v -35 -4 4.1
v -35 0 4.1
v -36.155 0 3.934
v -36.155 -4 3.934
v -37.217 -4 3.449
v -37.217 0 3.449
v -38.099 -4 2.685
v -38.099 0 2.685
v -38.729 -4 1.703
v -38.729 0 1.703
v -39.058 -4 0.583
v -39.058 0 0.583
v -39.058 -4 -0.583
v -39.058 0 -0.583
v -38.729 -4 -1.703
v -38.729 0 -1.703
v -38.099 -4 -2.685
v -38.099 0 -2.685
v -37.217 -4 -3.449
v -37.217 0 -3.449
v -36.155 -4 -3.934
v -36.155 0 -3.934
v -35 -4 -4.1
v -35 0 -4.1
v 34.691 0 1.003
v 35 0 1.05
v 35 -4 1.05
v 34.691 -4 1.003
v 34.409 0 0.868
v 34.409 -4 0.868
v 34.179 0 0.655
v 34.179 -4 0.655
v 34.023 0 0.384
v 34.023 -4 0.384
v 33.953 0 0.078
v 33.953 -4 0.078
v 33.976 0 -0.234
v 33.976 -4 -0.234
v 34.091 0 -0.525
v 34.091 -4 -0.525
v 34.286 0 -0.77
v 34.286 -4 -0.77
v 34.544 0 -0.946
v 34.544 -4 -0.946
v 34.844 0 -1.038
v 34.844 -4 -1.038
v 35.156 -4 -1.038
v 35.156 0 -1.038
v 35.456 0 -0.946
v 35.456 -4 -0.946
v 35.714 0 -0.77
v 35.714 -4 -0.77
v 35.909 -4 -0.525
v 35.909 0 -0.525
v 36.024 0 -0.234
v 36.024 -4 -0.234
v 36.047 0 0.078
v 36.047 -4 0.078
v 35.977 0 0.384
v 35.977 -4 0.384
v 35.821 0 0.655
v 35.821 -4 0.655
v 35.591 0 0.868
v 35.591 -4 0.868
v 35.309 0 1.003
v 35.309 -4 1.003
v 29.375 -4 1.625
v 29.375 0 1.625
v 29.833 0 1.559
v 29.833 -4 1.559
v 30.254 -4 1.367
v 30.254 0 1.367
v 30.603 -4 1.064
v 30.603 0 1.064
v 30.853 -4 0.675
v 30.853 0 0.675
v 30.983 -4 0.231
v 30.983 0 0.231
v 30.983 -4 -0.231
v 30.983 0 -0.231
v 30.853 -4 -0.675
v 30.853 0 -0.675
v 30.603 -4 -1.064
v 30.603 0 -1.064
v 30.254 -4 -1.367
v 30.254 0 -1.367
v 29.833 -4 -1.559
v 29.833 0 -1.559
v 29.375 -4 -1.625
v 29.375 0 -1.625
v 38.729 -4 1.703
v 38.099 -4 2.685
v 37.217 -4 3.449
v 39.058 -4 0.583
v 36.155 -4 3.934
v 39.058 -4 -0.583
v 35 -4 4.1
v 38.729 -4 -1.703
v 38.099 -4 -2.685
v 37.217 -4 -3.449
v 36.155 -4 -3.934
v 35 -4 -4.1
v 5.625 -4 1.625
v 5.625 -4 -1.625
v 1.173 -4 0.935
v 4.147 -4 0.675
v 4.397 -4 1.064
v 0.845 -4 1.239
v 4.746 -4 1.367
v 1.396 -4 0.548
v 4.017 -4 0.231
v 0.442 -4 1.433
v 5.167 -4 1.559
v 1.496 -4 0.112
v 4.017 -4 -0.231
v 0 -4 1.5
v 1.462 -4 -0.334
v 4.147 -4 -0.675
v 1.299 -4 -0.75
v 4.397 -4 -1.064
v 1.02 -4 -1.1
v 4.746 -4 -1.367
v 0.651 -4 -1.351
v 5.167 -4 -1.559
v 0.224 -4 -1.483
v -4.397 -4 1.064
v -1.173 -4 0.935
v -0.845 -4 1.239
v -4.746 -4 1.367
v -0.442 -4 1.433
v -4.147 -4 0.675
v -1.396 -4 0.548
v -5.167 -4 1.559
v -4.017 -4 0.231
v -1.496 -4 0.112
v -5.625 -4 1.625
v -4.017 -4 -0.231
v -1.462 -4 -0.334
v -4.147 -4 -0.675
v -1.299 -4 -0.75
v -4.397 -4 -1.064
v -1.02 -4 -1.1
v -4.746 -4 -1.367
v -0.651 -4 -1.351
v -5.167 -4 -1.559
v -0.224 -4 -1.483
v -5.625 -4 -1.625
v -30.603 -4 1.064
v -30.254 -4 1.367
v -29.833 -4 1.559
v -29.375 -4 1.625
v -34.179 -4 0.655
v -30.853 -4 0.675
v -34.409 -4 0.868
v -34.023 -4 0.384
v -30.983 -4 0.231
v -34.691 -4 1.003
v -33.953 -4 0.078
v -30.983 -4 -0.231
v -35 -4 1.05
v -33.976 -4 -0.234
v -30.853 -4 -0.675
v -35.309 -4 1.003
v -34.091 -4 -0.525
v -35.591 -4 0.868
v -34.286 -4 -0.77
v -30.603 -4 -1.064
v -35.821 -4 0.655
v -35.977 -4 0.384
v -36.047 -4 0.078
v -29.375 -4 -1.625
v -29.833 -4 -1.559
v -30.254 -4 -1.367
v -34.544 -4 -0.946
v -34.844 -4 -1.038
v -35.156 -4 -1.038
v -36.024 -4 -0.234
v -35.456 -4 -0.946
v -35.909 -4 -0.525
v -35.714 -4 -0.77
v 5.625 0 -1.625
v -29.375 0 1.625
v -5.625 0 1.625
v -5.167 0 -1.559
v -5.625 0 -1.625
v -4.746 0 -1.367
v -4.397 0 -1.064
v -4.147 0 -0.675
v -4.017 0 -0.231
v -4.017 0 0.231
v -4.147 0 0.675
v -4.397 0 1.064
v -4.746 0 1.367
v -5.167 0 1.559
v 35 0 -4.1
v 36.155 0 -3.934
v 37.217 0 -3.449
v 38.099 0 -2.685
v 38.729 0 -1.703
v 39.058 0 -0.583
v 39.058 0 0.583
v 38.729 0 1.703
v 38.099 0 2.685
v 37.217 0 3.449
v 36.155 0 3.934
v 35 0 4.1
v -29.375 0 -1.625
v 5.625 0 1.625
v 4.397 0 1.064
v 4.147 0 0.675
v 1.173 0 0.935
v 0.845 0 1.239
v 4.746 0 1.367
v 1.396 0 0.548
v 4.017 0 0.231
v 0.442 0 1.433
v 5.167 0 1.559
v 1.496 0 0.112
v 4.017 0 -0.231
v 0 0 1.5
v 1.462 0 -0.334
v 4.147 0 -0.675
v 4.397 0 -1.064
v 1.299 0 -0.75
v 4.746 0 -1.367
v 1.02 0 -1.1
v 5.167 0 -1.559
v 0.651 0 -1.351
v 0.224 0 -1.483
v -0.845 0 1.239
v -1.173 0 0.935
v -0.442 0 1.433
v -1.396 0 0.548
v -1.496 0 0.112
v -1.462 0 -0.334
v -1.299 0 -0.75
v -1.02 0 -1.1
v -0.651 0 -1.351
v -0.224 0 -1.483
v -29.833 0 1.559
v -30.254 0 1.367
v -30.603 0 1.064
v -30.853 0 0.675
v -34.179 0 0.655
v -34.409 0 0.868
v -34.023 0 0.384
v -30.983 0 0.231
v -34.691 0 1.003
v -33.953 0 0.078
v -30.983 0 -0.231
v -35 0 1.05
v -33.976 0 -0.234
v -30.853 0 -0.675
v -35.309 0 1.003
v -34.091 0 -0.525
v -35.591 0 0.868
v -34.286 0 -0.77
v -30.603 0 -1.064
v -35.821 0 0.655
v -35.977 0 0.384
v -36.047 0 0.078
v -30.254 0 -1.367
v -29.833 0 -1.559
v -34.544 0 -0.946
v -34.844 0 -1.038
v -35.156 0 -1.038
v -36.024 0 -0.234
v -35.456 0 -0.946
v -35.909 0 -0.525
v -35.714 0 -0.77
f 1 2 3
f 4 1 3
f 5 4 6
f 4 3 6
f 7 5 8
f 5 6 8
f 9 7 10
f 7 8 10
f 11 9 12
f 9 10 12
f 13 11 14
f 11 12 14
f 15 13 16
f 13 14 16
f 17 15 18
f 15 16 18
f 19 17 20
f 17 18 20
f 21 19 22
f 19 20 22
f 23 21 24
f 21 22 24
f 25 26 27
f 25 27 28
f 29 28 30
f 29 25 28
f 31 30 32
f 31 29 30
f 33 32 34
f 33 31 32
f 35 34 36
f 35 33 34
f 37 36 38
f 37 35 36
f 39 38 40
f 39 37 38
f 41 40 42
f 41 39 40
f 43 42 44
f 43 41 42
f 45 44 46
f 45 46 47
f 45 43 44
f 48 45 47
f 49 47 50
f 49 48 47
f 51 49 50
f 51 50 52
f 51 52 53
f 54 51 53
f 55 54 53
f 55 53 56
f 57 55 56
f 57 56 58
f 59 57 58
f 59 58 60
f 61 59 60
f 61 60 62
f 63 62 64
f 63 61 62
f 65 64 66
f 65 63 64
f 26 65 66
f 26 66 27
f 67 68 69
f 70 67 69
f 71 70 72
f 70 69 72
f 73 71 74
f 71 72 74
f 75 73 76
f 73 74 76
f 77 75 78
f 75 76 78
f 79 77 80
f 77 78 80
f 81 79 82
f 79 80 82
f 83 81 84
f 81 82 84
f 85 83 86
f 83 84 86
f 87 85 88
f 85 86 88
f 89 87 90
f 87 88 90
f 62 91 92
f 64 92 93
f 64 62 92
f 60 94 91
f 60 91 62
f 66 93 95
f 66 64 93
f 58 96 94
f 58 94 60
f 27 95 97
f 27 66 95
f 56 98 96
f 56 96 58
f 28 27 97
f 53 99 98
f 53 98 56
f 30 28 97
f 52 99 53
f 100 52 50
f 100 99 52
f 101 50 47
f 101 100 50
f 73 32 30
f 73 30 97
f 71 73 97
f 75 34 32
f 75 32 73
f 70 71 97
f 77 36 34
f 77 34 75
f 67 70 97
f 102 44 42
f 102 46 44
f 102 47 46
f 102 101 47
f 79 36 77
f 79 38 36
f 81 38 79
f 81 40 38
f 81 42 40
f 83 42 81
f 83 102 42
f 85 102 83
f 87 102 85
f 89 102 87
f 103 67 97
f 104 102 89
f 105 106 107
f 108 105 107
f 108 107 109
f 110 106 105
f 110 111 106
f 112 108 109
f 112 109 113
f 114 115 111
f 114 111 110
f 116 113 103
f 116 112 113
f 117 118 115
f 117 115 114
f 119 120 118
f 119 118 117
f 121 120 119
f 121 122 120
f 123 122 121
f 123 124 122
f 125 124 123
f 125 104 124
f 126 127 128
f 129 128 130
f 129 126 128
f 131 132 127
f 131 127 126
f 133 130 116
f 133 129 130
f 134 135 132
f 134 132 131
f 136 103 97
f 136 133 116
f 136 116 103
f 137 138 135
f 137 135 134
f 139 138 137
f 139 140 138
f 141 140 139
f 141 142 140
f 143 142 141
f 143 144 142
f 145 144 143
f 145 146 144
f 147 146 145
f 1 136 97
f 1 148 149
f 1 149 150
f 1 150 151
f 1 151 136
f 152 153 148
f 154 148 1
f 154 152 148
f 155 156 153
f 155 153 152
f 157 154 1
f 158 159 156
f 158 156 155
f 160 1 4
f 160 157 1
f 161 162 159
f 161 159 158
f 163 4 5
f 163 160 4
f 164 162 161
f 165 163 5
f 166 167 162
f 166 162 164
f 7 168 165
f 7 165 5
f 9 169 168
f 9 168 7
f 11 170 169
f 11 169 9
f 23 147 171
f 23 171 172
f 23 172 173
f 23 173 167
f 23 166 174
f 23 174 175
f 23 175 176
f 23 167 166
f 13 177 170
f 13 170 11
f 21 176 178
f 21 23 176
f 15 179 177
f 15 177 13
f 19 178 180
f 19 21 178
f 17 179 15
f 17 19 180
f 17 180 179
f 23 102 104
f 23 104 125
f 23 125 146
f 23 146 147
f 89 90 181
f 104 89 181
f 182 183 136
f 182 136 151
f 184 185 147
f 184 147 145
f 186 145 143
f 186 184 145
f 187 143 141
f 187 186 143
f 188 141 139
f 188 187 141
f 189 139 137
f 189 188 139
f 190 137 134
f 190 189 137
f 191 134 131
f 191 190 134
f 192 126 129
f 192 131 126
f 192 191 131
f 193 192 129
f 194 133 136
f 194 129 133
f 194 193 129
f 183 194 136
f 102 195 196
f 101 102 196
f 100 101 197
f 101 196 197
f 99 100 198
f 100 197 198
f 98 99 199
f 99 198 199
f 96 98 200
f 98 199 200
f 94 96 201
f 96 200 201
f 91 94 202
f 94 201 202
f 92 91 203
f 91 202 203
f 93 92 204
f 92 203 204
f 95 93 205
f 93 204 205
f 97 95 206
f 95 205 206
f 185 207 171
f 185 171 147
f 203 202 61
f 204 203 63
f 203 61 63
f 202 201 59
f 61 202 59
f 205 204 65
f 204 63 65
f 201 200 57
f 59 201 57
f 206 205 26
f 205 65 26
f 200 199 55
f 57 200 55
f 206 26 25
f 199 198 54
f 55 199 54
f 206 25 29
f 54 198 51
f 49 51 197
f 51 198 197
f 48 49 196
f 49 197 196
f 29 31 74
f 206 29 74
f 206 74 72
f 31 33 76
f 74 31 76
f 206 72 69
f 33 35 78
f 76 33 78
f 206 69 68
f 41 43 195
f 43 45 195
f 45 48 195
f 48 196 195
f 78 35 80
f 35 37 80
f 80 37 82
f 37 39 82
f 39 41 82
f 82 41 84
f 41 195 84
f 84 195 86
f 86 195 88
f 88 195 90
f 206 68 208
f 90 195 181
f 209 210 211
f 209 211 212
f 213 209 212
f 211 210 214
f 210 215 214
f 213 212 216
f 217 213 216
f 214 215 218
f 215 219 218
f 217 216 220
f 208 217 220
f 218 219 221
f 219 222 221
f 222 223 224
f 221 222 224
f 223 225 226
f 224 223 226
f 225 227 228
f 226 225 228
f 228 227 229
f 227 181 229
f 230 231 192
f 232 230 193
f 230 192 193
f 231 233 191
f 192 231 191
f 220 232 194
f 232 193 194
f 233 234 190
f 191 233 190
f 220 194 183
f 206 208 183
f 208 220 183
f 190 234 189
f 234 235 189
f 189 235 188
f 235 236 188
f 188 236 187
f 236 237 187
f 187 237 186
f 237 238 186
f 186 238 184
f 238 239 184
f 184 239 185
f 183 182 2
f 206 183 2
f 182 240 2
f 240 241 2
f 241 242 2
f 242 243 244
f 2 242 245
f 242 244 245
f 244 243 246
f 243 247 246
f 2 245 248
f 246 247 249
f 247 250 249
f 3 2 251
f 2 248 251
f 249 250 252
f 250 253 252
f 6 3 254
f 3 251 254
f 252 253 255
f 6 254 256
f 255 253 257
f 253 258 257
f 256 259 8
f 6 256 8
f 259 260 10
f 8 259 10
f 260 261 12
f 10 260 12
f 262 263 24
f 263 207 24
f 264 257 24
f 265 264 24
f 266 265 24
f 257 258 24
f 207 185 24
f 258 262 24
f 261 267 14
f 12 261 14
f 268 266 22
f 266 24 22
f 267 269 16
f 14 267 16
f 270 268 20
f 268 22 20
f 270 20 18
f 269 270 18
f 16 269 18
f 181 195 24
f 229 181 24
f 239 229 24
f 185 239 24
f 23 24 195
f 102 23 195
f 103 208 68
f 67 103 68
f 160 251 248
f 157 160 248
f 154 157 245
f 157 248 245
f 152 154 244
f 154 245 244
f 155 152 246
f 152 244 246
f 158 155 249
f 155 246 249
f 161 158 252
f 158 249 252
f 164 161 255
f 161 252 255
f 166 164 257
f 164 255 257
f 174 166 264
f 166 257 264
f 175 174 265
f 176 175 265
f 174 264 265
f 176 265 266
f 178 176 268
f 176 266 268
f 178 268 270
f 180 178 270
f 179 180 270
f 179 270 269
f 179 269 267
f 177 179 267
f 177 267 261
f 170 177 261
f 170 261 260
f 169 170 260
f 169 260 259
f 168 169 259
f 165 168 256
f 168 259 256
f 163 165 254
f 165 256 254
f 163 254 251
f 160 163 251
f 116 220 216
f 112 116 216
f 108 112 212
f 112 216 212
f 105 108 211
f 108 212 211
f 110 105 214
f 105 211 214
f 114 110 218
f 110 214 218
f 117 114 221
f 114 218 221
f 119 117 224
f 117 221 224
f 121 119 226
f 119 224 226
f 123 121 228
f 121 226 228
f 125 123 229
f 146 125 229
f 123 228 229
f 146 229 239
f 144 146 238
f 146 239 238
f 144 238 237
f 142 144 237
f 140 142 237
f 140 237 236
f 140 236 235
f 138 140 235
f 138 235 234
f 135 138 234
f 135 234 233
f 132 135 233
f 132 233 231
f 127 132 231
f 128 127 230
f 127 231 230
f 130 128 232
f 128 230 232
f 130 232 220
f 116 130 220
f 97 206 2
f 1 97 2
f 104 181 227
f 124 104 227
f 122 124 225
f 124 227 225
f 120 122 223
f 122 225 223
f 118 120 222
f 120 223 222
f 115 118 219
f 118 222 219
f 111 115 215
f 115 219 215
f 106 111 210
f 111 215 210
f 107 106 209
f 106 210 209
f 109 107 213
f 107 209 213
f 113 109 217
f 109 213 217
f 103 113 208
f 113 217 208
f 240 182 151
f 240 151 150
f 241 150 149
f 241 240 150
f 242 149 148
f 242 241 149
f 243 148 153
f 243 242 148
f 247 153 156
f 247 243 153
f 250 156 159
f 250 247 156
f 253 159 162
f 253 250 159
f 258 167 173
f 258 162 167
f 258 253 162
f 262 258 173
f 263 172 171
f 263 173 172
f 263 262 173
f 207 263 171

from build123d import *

# Parameters (mm, degrees)
BOSS_EXTRUDE1_DEPTH = 4
SKETCH2_R           = 1.5
CUT_EXTRUDE1_DEPTH  = 4
SKETCH6_R           = 1.05
CUT_EXTRUDE2_DEPTH  = 4
CUT_EXTRUDE3_DEPTH  = 40.517337967


with BuildPart() as part:
    # Sketch1 → Boss-Extrude1 (new body)
    with BuildSketch(Plane(origin=(0, 0, 0), x_dir=(1, 0, 0), z_dir=(0, 1, 0))):
        with BuildLine():
            Line((35, -4.1), (-35, -4.1))
            ThreePointArc((-35, -4.1), (-39.1, 0), (-35, 4.1))
            Line((-35, 4.1), (35, 4.1))
            ThreePointArc((35, 4.1), (39.1, 0), (35, -4.1))
        make_face()
    extrude(amount=-BOSS_EXTRUDE1_DEPTH)

    # Sketch2 → Cut-Extrude1 (cut)
    with BuildSketch(Plane(origin=(0, 0, 0), x_dir=(1, 0, 0), z_dir=(0, 1, 0))):
        with Locations(Location((0, 0, 0), (0, 0, 270))):
            Circle(SKETCH2_R)
    extrude(amount=-CUT_EXTRUDE1_DEPTH, mode=Mode.SUBTRACT)

    # Sketch6 → Cut-Extrude2 (cut)
    with BuildSketch(Plane(origin=(0, 0, 0), x_dir=(1, 0, 0), z_dir=(0, 1, 0))):
        with Locations(Location((-35, 0, 0), (0, 0, 270))):
            Circle(SKETCH6_R)
    cut_extrude2 = extrude(amount=-CUT_EXTRUDE2_DEPTH, mode=Mode.SUBTRACT)

    # Sketch7 → Cut-Extrude3 (cut, through all)
    with BuildSketch(Plane(origin=(0, 0, 0), x_dir=(1, 0, 0), z_dir=(0, 1, 0))):
        with BuildLine():
            Line((-29.375, 1.625), (-5.625, 1.625))
            ThreePointArc((-5.625, 1.625), (-4, 0), (-5.625, -1.625))
            Line((-5.625, -1.625), (-29.375, -1.625))
            ThreePointArc((-29.375, -1.625), (-31, 0), (-29.375, 1.625))
        make_face()
    cut_extrude3 = extrude(amount=-CUT_EXTRUDE3_DEPTH, mode=Mode.SUBTRACT)

    # Mirror1: Cut-Extrude2, Cut-Extrude3 across plane
    add(cut_extrude2.mirror(Plane(origin=(0, 0, 0), x_dir=(0, 0, 1), z_dir=(1, 0, 0))), mode=Mode.SUBTRACT)
    add(cut_extrude3.mirror(Plane(origin=(0, 0, 0), x_dir=(0, 0, 1), z_dir=(1, 0, 0))), mode=Mode.SUBTRACT)


solid = part.part
